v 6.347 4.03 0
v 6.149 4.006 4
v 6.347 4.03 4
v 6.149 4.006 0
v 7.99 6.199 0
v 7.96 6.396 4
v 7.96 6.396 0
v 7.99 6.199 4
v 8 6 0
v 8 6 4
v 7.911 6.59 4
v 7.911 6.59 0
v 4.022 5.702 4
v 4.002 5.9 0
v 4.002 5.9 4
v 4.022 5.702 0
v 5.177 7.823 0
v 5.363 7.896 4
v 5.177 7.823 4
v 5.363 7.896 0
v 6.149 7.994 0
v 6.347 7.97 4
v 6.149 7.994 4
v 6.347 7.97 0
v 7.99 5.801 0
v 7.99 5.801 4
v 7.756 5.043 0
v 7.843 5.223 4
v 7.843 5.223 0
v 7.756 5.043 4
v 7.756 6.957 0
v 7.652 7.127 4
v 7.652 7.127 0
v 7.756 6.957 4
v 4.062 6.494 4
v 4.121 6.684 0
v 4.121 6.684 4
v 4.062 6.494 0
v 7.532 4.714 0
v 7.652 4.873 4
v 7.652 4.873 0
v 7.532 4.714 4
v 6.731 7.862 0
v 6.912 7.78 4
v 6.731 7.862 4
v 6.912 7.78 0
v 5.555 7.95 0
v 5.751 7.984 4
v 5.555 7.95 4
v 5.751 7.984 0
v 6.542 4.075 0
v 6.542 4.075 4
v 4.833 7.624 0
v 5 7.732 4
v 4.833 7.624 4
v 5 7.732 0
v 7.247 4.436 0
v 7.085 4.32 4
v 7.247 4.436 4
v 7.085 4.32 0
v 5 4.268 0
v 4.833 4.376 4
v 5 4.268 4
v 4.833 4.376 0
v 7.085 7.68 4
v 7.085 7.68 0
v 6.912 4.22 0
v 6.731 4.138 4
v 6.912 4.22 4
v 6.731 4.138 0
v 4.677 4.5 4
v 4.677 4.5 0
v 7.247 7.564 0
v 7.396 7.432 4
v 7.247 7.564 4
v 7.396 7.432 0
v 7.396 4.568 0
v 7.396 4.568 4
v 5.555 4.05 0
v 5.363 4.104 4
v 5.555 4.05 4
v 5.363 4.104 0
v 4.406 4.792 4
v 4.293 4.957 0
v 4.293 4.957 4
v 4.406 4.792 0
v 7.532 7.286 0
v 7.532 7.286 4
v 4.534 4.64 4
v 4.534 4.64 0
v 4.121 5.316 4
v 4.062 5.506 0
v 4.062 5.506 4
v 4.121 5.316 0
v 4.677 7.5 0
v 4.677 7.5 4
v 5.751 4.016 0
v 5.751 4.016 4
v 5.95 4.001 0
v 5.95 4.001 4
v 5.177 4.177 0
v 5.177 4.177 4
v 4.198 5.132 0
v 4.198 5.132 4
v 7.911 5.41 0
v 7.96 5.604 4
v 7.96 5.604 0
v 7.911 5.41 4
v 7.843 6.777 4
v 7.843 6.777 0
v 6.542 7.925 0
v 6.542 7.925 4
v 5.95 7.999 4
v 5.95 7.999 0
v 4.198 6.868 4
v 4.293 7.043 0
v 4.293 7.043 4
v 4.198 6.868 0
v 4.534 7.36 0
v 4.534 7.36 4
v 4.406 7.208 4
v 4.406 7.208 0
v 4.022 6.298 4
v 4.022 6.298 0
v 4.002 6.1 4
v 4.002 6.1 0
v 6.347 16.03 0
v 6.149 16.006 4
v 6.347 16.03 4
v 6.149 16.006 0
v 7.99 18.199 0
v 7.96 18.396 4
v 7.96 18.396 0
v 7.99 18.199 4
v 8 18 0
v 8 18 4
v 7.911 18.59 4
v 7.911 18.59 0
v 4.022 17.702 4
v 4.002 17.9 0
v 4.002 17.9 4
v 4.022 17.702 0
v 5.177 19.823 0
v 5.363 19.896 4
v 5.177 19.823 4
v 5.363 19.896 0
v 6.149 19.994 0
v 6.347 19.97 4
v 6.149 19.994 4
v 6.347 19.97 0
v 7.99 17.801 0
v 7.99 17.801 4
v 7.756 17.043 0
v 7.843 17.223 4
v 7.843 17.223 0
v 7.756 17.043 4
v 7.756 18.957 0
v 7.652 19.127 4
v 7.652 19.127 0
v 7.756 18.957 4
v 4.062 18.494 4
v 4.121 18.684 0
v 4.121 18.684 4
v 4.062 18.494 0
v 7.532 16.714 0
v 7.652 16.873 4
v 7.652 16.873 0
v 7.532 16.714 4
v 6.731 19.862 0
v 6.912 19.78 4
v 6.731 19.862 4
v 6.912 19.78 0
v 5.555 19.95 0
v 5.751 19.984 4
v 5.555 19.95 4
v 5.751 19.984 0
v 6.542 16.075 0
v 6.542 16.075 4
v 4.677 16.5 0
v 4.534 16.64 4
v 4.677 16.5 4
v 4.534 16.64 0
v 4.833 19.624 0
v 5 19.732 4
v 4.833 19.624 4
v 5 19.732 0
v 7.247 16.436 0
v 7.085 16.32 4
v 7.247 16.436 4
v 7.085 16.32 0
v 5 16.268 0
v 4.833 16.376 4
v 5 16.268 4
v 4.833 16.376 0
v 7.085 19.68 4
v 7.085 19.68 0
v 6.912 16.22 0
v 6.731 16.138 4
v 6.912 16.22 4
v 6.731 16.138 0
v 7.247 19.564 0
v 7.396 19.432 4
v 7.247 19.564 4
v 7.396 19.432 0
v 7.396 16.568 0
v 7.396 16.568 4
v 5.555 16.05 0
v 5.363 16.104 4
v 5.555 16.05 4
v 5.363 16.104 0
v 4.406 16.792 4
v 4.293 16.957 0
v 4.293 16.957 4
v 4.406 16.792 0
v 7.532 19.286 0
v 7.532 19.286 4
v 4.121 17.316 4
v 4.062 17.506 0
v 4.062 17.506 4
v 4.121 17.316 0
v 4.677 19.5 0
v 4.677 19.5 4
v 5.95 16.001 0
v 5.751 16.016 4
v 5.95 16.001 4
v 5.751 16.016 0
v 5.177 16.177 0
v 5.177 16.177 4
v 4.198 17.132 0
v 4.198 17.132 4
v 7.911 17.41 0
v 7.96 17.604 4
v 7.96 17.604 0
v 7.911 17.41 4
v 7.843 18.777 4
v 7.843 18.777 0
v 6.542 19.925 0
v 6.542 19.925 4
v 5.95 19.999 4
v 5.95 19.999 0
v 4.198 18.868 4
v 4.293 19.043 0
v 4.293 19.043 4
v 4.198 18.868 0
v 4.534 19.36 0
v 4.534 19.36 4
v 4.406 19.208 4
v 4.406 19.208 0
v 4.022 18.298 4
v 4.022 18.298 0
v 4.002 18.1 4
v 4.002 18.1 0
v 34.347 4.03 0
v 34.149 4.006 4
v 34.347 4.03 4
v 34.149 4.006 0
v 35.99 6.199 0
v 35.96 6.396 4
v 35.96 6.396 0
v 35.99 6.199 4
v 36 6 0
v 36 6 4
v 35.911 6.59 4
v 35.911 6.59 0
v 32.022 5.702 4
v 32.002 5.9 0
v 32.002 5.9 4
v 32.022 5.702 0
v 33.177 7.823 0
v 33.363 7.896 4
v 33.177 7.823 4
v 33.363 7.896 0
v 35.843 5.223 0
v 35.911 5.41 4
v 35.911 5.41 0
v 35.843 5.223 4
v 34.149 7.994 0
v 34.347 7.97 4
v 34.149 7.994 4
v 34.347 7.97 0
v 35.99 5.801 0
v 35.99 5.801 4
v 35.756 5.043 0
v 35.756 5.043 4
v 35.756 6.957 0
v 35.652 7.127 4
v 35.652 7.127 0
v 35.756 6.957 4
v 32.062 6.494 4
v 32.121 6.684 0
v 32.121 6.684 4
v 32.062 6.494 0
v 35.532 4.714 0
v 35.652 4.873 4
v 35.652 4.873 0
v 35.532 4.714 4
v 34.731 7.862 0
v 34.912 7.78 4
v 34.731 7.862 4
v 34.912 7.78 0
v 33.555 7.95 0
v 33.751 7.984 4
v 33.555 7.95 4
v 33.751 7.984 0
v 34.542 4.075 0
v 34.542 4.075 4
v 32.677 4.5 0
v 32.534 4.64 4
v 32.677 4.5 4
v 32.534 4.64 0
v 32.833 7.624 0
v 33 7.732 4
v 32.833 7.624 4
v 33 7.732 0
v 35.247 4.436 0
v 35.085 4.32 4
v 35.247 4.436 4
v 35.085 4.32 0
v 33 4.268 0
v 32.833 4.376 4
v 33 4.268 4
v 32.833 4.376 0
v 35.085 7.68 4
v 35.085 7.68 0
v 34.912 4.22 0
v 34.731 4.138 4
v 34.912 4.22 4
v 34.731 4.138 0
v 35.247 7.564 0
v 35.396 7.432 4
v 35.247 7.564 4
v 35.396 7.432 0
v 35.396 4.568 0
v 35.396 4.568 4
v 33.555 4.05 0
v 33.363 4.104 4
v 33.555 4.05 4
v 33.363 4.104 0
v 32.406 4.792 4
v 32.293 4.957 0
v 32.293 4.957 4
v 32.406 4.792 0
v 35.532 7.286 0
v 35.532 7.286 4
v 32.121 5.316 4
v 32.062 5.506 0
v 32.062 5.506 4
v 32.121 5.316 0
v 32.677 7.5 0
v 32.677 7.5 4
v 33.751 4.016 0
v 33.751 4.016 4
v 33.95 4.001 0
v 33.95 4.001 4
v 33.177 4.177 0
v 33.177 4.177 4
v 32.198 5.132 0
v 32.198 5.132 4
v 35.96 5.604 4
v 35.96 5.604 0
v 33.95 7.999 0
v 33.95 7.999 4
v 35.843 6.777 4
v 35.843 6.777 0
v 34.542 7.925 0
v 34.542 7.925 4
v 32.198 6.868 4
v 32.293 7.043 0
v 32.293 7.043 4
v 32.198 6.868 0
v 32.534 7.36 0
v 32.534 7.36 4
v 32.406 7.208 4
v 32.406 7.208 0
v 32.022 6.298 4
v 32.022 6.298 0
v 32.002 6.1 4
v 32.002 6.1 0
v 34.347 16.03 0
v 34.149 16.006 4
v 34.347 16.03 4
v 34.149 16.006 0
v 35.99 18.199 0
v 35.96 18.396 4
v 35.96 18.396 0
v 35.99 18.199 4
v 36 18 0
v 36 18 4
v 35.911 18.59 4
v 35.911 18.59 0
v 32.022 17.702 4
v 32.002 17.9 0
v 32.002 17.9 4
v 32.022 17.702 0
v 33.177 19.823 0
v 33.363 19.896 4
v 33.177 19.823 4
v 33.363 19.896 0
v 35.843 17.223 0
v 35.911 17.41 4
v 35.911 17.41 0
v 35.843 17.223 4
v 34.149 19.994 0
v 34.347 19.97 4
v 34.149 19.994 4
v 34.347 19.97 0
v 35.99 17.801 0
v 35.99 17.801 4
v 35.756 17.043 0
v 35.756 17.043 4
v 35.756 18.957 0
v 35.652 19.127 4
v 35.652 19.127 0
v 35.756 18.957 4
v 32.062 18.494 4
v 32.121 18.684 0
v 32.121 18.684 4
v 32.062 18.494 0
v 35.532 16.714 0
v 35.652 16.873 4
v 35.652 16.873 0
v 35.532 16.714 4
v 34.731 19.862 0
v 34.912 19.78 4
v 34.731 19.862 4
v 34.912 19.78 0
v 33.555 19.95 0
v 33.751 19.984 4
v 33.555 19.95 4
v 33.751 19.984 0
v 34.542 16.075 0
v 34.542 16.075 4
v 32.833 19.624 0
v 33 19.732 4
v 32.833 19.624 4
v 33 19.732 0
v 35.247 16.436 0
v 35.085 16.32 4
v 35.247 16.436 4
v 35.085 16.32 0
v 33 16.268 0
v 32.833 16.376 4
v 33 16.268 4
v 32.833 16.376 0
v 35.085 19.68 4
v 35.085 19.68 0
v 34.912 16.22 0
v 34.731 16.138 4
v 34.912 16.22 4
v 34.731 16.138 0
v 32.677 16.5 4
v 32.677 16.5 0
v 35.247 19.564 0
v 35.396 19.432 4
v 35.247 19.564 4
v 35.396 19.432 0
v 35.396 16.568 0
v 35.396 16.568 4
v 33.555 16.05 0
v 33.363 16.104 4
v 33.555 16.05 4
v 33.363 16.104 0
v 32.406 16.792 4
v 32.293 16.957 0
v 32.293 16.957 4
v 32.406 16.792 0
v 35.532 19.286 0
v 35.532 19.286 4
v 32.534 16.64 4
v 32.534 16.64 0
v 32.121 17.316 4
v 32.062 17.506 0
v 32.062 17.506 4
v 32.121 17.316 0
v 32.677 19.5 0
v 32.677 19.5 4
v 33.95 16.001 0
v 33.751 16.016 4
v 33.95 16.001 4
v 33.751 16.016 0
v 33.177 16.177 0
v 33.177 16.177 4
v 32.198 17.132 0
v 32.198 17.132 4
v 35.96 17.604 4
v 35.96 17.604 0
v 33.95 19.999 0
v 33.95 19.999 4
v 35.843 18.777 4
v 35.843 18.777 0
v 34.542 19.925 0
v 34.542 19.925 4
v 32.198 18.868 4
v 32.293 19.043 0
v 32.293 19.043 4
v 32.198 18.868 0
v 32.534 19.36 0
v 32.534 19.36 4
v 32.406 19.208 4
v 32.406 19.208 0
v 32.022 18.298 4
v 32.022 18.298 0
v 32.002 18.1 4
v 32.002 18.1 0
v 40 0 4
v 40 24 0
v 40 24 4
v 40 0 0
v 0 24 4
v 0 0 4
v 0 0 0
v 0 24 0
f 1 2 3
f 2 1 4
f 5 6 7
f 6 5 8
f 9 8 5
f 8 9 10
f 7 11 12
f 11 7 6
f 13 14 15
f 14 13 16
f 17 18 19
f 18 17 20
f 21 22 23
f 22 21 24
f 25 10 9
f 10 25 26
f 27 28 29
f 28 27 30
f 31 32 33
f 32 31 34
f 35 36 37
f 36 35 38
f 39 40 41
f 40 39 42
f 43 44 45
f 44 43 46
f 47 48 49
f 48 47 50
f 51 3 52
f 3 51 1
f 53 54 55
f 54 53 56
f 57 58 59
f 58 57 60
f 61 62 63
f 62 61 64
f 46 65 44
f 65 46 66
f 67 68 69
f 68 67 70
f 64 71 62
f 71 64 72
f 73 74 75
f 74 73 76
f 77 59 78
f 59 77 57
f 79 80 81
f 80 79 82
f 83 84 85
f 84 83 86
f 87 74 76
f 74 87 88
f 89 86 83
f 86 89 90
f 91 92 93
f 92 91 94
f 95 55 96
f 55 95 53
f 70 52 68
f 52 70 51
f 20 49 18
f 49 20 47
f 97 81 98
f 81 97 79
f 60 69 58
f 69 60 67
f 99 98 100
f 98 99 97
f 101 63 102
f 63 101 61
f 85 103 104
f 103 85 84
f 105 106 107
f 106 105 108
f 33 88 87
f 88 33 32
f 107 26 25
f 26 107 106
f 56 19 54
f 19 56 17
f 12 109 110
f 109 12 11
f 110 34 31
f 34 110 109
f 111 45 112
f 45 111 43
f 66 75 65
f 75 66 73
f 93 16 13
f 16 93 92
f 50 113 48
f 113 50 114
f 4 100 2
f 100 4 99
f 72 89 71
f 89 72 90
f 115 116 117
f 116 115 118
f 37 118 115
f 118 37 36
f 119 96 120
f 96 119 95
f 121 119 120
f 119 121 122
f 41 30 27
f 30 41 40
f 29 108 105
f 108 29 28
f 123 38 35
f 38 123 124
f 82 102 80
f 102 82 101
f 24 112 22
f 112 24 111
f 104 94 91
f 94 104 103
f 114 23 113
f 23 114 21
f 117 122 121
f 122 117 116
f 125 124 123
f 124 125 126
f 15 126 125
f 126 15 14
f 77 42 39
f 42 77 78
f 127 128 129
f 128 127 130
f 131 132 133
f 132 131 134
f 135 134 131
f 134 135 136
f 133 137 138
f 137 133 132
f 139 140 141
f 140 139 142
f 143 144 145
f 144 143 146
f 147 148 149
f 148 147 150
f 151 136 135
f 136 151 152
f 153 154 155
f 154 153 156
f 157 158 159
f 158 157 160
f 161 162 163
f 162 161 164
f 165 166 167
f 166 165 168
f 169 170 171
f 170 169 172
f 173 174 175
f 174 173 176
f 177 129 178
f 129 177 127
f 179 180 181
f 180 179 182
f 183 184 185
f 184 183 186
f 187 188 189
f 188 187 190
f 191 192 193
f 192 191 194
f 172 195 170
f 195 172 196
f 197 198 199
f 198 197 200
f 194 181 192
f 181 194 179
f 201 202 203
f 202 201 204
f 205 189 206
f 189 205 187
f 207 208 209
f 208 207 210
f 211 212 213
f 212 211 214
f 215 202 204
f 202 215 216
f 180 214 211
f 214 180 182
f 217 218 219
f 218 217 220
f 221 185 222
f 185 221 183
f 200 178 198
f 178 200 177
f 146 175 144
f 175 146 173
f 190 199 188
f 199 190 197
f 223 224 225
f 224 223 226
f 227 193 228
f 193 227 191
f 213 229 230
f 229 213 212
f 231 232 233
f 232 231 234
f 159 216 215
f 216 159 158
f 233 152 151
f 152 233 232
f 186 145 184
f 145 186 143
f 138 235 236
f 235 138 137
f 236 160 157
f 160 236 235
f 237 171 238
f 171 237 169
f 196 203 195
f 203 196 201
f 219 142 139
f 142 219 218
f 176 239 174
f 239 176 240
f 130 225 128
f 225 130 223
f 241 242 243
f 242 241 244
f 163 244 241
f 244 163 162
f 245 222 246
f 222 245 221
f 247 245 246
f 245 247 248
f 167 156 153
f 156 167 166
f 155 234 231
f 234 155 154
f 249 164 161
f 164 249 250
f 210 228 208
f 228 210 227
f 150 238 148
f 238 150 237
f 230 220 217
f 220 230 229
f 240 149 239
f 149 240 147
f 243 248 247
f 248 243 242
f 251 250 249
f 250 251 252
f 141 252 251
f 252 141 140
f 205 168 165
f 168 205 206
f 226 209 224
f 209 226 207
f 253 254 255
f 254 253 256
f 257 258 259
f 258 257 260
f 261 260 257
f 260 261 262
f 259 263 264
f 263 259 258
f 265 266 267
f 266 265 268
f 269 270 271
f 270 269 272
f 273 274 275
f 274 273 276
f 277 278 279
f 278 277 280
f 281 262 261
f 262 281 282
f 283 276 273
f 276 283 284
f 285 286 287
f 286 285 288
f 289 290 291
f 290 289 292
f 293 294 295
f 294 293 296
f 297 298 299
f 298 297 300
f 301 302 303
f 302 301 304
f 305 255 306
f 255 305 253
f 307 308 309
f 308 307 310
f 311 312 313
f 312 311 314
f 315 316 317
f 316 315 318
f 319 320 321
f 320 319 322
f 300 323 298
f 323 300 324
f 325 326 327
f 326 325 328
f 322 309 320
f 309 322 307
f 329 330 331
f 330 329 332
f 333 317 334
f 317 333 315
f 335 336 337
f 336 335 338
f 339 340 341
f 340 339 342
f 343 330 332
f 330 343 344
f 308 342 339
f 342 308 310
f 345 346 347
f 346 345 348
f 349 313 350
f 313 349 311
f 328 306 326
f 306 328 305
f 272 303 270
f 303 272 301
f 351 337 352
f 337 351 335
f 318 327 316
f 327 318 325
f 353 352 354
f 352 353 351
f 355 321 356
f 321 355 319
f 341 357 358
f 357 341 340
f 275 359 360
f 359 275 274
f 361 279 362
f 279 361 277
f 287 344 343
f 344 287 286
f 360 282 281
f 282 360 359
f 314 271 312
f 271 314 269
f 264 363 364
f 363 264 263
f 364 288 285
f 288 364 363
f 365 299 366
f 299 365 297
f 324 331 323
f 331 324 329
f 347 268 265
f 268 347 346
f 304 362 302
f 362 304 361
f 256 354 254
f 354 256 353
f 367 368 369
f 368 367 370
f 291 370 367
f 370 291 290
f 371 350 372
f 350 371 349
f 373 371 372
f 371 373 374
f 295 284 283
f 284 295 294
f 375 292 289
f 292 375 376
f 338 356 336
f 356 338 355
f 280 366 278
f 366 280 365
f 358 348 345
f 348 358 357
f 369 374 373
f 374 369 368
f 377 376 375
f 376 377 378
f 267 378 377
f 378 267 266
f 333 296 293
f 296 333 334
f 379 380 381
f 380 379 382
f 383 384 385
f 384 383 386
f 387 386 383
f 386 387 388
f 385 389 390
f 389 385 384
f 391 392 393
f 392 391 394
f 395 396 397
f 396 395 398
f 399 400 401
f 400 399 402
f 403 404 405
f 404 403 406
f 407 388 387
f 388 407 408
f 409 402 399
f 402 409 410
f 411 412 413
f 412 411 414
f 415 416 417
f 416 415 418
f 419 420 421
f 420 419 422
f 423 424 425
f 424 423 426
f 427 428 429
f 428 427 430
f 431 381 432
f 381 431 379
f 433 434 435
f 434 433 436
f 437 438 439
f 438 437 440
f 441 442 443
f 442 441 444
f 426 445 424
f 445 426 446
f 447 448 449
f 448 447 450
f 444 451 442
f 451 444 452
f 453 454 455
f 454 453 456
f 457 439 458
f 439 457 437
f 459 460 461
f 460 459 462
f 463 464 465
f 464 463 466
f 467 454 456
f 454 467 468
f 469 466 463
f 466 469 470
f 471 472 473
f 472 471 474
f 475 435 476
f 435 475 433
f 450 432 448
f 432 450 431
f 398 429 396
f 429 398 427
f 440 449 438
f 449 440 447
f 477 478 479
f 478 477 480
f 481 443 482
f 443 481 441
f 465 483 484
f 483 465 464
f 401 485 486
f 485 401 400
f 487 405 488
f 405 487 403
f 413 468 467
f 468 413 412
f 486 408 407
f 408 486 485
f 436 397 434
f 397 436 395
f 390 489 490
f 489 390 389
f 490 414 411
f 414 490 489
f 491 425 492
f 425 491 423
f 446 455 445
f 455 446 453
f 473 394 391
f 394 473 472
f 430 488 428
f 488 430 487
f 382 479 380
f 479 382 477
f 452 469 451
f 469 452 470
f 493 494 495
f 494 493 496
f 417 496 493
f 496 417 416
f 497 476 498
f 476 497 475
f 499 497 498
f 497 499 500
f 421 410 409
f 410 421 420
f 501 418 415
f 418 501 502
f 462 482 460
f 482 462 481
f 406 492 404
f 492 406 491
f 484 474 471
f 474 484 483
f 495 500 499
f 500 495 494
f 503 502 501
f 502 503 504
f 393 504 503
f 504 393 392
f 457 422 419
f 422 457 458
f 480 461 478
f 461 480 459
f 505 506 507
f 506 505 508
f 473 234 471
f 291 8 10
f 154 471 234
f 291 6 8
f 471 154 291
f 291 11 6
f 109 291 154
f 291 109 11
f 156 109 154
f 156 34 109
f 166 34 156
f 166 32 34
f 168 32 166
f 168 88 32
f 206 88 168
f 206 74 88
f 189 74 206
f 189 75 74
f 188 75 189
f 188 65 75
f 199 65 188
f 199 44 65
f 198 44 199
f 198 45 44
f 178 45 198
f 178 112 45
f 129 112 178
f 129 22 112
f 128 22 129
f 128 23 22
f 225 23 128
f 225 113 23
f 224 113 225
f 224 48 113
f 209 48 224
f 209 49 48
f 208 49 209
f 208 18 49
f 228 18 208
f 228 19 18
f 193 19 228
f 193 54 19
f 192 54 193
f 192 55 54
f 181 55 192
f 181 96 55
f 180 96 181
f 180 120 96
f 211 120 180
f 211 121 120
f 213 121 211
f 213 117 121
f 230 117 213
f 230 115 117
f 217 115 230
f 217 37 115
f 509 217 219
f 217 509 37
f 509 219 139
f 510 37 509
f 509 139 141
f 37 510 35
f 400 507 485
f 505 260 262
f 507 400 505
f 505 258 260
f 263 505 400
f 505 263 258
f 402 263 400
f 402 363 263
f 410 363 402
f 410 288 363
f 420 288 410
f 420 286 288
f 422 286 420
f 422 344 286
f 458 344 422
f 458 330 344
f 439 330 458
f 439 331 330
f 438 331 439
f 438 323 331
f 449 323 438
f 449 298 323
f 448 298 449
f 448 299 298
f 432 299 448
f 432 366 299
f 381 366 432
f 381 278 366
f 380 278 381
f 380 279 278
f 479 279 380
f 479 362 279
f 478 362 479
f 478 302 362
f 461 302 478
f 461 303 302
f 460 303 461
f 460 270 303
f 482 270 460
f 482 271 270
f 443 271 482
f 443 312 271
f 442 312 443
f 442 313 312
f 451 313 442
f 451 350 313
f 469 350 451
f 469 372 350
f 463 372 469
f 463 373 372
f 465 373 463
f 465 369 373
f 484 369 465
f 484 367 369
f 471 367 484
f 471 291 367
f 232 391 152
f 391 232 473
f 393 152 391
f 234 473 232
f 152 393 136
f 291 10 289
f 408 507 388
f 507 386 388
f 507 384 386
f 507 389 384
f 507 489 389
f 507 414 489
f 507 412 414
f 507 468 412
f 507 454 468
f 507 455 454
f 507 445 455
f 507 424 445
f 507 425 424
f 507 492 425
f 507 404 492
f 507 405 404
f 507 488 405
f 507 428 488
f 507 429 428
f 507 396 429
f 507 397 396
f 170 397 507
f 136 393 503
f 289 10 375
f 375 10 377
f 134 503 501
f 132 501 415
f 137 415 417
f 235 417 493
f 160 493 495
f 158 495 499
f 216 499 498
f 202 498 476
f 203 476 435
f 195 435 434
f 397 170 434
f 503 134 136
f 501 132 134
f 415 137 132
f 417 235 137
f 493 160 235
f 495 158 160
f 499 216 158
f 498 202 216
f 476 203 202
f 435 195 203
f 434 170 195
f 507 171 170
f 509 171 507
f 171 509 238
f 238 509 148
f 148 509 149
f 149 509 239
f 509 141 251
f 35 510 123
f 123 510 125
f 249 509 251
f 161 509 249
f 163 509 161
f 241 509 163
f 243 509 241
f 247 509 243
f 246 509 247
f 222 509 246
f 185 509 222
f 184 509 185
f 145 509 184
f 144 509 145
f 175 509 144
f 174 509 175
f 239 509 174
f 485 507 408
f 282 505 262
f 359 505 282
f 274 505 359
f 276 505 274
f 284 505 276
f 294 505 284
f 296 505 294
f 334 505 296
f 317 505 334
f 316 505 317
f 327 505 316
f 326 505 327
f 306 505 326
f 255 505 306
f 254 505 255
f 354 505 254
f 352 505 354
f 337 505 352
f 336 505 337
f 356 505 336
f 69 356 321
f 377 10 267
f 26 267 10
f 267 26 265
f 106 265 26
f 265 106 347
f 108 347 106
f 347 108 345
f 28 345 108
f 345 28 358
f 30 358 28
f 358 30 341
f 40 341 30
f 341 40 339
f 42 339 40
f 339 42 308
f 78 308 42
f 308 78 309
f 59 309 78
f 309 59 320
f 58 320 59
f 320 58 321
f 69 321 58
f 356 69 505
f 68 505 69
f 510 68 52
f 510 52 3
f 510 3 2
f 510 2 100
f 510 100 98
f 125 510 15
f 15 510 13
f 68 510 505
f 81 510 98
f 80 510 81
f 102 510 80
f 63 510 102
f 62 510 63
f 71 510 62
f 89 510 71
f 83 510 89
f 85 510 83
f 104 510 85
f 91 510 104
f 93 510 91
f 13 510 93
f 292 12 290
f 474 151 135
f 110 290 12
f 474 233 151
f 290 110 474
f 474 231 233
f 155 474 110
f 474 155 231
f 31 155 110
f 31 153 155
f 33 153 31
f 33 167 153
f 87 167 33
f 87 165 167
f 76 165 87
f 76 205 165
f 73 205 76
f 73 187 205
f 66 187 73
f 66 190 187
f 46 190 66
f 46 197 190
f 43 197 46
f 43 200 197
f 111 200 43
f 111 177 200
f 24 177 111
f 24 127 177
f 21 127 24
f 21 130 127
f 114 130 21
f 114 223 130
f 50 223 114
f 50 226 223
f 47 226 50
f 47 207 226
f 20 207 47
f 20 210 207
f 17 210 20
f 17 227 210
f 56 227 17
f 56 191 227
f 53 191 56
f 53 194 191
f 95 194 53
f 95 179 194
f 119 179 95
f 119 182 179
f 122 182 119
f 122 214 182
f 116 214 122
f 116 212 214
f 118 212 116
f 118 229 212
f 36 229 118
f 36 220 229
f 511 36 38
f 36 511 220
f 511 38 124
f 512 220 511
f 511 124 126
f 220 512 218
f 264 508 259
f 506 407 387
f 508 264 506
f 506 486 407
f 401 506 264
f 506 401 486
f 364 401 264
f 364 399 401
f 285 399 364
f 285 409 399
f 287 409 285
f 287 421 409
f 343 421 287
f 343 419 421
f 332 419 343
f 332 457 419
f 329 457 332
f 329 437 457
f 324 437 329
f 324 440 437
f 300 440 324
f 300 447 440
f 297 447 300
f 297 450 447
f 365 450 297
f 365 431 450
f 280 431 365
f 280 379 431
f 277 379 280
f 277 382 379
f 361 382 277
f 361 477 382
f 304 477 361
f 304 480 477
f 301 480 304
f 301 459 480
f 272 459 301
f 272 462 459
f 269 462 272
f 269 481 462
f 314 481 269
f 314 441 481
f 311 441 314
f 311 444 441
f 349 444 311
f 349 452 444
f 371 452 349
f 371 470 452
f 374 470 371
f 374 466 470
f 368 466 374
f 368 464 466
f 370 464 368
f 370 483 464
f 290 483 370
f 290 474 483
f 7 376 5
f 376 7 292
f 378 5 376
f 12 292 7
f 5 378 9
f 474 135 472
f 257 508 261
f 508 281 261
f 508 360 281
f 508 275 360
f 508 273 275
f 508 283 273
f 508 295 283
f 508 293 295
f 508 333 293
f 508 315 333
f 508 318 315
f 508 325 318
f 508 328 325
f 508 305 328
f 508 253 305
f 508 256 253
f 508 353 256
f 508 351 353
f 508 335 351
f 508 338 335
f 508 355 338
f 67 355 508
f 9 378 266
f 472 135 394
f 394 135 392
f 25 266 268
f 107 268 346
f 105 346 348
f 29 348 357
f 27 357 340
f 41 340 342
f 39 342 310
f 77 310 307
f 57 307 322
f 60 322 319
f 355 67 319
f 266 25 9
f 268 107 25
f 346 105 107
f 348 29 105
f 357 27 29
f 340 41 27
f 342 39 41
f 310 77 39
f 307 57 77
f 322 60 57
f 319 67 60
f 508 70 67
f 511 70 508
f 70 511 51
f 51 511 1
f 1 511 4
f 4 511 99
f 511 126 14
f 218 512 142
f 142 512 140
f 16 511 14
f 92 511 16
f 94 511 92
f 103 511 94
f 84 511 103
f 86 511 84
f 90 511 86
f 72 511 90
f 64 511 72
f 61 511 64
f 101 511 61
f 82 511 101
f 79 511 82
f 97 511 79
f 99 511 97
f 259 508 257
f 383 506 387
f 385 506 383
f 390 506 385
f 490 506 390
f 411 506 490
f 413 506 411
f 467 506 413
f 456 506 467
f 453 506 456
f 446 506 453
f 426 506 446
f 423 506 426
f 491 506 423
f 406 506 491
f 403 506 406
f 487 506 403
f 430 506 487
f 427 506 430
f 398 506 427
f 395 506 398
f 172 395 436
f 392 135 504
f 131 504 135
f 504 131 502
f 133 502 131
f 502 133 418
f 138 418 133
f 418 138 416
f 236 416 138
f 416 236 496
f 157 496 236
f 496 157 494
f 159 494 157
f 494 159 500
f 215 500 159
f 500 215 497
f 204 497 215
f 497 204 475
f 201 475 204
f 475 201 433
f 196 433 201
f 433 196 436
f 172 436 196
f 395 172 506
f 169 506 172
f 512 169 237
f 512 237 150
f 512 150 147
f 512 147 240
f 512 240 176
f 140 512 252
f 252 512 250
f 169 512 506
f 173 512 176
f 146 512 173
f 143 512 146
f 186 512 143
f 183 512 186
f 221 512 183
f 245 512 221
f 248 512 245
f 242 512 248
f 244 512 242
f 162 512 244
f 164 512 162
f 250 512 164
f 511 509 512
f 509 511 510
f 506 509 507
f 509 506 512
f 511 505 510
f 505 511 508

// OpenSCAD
// Millimeter coordinates; geometry example, not a calibrated fit specification.
/* [Plate] */
width = 40;          // [20:1:120]
depth = 24;          // [20:1:100]
thickness = 4;       // [1:0.5:12]
/* [Holes] */
hole_diameter = 4;   // [1:0.5:12]
inset = 6;           // Center distance from each neighboring outer edge.
/* [Hidden] */
$fn = 0;
$fa = 4;
$fs = 0.2;
epsilon = min(0.01, thickness / 100);

assert(width > 0 && depth > 0 && thickness > 0 && hole_diameter > 0,
       "Dimensions must be positive");
assert(inset > hole_diameter / 2, "Holes must stay inside the plate");
assert(min(width, depth) > 2 * inset + hole_diameter,
       "Opposite holes must stay separate");

echo(extents_mm = [width, depth, thickness], hole_diameter_mm = hole_diameter);
echo(hole_centers_mm = [for (x = [inset, width - inset])
                           for (y = [inset, depth - inset]) [x, y]]);

difference() {
    cube([width, depth, thickness], center = false);
    for (x = [inset, width - inset])
        for (y = [inset, depth - inset])
            translate([x, y, -epsilon])
                cylinder(d = hole_diameter, h = thickness + 2 * epsilon,
                         center = false);
}
